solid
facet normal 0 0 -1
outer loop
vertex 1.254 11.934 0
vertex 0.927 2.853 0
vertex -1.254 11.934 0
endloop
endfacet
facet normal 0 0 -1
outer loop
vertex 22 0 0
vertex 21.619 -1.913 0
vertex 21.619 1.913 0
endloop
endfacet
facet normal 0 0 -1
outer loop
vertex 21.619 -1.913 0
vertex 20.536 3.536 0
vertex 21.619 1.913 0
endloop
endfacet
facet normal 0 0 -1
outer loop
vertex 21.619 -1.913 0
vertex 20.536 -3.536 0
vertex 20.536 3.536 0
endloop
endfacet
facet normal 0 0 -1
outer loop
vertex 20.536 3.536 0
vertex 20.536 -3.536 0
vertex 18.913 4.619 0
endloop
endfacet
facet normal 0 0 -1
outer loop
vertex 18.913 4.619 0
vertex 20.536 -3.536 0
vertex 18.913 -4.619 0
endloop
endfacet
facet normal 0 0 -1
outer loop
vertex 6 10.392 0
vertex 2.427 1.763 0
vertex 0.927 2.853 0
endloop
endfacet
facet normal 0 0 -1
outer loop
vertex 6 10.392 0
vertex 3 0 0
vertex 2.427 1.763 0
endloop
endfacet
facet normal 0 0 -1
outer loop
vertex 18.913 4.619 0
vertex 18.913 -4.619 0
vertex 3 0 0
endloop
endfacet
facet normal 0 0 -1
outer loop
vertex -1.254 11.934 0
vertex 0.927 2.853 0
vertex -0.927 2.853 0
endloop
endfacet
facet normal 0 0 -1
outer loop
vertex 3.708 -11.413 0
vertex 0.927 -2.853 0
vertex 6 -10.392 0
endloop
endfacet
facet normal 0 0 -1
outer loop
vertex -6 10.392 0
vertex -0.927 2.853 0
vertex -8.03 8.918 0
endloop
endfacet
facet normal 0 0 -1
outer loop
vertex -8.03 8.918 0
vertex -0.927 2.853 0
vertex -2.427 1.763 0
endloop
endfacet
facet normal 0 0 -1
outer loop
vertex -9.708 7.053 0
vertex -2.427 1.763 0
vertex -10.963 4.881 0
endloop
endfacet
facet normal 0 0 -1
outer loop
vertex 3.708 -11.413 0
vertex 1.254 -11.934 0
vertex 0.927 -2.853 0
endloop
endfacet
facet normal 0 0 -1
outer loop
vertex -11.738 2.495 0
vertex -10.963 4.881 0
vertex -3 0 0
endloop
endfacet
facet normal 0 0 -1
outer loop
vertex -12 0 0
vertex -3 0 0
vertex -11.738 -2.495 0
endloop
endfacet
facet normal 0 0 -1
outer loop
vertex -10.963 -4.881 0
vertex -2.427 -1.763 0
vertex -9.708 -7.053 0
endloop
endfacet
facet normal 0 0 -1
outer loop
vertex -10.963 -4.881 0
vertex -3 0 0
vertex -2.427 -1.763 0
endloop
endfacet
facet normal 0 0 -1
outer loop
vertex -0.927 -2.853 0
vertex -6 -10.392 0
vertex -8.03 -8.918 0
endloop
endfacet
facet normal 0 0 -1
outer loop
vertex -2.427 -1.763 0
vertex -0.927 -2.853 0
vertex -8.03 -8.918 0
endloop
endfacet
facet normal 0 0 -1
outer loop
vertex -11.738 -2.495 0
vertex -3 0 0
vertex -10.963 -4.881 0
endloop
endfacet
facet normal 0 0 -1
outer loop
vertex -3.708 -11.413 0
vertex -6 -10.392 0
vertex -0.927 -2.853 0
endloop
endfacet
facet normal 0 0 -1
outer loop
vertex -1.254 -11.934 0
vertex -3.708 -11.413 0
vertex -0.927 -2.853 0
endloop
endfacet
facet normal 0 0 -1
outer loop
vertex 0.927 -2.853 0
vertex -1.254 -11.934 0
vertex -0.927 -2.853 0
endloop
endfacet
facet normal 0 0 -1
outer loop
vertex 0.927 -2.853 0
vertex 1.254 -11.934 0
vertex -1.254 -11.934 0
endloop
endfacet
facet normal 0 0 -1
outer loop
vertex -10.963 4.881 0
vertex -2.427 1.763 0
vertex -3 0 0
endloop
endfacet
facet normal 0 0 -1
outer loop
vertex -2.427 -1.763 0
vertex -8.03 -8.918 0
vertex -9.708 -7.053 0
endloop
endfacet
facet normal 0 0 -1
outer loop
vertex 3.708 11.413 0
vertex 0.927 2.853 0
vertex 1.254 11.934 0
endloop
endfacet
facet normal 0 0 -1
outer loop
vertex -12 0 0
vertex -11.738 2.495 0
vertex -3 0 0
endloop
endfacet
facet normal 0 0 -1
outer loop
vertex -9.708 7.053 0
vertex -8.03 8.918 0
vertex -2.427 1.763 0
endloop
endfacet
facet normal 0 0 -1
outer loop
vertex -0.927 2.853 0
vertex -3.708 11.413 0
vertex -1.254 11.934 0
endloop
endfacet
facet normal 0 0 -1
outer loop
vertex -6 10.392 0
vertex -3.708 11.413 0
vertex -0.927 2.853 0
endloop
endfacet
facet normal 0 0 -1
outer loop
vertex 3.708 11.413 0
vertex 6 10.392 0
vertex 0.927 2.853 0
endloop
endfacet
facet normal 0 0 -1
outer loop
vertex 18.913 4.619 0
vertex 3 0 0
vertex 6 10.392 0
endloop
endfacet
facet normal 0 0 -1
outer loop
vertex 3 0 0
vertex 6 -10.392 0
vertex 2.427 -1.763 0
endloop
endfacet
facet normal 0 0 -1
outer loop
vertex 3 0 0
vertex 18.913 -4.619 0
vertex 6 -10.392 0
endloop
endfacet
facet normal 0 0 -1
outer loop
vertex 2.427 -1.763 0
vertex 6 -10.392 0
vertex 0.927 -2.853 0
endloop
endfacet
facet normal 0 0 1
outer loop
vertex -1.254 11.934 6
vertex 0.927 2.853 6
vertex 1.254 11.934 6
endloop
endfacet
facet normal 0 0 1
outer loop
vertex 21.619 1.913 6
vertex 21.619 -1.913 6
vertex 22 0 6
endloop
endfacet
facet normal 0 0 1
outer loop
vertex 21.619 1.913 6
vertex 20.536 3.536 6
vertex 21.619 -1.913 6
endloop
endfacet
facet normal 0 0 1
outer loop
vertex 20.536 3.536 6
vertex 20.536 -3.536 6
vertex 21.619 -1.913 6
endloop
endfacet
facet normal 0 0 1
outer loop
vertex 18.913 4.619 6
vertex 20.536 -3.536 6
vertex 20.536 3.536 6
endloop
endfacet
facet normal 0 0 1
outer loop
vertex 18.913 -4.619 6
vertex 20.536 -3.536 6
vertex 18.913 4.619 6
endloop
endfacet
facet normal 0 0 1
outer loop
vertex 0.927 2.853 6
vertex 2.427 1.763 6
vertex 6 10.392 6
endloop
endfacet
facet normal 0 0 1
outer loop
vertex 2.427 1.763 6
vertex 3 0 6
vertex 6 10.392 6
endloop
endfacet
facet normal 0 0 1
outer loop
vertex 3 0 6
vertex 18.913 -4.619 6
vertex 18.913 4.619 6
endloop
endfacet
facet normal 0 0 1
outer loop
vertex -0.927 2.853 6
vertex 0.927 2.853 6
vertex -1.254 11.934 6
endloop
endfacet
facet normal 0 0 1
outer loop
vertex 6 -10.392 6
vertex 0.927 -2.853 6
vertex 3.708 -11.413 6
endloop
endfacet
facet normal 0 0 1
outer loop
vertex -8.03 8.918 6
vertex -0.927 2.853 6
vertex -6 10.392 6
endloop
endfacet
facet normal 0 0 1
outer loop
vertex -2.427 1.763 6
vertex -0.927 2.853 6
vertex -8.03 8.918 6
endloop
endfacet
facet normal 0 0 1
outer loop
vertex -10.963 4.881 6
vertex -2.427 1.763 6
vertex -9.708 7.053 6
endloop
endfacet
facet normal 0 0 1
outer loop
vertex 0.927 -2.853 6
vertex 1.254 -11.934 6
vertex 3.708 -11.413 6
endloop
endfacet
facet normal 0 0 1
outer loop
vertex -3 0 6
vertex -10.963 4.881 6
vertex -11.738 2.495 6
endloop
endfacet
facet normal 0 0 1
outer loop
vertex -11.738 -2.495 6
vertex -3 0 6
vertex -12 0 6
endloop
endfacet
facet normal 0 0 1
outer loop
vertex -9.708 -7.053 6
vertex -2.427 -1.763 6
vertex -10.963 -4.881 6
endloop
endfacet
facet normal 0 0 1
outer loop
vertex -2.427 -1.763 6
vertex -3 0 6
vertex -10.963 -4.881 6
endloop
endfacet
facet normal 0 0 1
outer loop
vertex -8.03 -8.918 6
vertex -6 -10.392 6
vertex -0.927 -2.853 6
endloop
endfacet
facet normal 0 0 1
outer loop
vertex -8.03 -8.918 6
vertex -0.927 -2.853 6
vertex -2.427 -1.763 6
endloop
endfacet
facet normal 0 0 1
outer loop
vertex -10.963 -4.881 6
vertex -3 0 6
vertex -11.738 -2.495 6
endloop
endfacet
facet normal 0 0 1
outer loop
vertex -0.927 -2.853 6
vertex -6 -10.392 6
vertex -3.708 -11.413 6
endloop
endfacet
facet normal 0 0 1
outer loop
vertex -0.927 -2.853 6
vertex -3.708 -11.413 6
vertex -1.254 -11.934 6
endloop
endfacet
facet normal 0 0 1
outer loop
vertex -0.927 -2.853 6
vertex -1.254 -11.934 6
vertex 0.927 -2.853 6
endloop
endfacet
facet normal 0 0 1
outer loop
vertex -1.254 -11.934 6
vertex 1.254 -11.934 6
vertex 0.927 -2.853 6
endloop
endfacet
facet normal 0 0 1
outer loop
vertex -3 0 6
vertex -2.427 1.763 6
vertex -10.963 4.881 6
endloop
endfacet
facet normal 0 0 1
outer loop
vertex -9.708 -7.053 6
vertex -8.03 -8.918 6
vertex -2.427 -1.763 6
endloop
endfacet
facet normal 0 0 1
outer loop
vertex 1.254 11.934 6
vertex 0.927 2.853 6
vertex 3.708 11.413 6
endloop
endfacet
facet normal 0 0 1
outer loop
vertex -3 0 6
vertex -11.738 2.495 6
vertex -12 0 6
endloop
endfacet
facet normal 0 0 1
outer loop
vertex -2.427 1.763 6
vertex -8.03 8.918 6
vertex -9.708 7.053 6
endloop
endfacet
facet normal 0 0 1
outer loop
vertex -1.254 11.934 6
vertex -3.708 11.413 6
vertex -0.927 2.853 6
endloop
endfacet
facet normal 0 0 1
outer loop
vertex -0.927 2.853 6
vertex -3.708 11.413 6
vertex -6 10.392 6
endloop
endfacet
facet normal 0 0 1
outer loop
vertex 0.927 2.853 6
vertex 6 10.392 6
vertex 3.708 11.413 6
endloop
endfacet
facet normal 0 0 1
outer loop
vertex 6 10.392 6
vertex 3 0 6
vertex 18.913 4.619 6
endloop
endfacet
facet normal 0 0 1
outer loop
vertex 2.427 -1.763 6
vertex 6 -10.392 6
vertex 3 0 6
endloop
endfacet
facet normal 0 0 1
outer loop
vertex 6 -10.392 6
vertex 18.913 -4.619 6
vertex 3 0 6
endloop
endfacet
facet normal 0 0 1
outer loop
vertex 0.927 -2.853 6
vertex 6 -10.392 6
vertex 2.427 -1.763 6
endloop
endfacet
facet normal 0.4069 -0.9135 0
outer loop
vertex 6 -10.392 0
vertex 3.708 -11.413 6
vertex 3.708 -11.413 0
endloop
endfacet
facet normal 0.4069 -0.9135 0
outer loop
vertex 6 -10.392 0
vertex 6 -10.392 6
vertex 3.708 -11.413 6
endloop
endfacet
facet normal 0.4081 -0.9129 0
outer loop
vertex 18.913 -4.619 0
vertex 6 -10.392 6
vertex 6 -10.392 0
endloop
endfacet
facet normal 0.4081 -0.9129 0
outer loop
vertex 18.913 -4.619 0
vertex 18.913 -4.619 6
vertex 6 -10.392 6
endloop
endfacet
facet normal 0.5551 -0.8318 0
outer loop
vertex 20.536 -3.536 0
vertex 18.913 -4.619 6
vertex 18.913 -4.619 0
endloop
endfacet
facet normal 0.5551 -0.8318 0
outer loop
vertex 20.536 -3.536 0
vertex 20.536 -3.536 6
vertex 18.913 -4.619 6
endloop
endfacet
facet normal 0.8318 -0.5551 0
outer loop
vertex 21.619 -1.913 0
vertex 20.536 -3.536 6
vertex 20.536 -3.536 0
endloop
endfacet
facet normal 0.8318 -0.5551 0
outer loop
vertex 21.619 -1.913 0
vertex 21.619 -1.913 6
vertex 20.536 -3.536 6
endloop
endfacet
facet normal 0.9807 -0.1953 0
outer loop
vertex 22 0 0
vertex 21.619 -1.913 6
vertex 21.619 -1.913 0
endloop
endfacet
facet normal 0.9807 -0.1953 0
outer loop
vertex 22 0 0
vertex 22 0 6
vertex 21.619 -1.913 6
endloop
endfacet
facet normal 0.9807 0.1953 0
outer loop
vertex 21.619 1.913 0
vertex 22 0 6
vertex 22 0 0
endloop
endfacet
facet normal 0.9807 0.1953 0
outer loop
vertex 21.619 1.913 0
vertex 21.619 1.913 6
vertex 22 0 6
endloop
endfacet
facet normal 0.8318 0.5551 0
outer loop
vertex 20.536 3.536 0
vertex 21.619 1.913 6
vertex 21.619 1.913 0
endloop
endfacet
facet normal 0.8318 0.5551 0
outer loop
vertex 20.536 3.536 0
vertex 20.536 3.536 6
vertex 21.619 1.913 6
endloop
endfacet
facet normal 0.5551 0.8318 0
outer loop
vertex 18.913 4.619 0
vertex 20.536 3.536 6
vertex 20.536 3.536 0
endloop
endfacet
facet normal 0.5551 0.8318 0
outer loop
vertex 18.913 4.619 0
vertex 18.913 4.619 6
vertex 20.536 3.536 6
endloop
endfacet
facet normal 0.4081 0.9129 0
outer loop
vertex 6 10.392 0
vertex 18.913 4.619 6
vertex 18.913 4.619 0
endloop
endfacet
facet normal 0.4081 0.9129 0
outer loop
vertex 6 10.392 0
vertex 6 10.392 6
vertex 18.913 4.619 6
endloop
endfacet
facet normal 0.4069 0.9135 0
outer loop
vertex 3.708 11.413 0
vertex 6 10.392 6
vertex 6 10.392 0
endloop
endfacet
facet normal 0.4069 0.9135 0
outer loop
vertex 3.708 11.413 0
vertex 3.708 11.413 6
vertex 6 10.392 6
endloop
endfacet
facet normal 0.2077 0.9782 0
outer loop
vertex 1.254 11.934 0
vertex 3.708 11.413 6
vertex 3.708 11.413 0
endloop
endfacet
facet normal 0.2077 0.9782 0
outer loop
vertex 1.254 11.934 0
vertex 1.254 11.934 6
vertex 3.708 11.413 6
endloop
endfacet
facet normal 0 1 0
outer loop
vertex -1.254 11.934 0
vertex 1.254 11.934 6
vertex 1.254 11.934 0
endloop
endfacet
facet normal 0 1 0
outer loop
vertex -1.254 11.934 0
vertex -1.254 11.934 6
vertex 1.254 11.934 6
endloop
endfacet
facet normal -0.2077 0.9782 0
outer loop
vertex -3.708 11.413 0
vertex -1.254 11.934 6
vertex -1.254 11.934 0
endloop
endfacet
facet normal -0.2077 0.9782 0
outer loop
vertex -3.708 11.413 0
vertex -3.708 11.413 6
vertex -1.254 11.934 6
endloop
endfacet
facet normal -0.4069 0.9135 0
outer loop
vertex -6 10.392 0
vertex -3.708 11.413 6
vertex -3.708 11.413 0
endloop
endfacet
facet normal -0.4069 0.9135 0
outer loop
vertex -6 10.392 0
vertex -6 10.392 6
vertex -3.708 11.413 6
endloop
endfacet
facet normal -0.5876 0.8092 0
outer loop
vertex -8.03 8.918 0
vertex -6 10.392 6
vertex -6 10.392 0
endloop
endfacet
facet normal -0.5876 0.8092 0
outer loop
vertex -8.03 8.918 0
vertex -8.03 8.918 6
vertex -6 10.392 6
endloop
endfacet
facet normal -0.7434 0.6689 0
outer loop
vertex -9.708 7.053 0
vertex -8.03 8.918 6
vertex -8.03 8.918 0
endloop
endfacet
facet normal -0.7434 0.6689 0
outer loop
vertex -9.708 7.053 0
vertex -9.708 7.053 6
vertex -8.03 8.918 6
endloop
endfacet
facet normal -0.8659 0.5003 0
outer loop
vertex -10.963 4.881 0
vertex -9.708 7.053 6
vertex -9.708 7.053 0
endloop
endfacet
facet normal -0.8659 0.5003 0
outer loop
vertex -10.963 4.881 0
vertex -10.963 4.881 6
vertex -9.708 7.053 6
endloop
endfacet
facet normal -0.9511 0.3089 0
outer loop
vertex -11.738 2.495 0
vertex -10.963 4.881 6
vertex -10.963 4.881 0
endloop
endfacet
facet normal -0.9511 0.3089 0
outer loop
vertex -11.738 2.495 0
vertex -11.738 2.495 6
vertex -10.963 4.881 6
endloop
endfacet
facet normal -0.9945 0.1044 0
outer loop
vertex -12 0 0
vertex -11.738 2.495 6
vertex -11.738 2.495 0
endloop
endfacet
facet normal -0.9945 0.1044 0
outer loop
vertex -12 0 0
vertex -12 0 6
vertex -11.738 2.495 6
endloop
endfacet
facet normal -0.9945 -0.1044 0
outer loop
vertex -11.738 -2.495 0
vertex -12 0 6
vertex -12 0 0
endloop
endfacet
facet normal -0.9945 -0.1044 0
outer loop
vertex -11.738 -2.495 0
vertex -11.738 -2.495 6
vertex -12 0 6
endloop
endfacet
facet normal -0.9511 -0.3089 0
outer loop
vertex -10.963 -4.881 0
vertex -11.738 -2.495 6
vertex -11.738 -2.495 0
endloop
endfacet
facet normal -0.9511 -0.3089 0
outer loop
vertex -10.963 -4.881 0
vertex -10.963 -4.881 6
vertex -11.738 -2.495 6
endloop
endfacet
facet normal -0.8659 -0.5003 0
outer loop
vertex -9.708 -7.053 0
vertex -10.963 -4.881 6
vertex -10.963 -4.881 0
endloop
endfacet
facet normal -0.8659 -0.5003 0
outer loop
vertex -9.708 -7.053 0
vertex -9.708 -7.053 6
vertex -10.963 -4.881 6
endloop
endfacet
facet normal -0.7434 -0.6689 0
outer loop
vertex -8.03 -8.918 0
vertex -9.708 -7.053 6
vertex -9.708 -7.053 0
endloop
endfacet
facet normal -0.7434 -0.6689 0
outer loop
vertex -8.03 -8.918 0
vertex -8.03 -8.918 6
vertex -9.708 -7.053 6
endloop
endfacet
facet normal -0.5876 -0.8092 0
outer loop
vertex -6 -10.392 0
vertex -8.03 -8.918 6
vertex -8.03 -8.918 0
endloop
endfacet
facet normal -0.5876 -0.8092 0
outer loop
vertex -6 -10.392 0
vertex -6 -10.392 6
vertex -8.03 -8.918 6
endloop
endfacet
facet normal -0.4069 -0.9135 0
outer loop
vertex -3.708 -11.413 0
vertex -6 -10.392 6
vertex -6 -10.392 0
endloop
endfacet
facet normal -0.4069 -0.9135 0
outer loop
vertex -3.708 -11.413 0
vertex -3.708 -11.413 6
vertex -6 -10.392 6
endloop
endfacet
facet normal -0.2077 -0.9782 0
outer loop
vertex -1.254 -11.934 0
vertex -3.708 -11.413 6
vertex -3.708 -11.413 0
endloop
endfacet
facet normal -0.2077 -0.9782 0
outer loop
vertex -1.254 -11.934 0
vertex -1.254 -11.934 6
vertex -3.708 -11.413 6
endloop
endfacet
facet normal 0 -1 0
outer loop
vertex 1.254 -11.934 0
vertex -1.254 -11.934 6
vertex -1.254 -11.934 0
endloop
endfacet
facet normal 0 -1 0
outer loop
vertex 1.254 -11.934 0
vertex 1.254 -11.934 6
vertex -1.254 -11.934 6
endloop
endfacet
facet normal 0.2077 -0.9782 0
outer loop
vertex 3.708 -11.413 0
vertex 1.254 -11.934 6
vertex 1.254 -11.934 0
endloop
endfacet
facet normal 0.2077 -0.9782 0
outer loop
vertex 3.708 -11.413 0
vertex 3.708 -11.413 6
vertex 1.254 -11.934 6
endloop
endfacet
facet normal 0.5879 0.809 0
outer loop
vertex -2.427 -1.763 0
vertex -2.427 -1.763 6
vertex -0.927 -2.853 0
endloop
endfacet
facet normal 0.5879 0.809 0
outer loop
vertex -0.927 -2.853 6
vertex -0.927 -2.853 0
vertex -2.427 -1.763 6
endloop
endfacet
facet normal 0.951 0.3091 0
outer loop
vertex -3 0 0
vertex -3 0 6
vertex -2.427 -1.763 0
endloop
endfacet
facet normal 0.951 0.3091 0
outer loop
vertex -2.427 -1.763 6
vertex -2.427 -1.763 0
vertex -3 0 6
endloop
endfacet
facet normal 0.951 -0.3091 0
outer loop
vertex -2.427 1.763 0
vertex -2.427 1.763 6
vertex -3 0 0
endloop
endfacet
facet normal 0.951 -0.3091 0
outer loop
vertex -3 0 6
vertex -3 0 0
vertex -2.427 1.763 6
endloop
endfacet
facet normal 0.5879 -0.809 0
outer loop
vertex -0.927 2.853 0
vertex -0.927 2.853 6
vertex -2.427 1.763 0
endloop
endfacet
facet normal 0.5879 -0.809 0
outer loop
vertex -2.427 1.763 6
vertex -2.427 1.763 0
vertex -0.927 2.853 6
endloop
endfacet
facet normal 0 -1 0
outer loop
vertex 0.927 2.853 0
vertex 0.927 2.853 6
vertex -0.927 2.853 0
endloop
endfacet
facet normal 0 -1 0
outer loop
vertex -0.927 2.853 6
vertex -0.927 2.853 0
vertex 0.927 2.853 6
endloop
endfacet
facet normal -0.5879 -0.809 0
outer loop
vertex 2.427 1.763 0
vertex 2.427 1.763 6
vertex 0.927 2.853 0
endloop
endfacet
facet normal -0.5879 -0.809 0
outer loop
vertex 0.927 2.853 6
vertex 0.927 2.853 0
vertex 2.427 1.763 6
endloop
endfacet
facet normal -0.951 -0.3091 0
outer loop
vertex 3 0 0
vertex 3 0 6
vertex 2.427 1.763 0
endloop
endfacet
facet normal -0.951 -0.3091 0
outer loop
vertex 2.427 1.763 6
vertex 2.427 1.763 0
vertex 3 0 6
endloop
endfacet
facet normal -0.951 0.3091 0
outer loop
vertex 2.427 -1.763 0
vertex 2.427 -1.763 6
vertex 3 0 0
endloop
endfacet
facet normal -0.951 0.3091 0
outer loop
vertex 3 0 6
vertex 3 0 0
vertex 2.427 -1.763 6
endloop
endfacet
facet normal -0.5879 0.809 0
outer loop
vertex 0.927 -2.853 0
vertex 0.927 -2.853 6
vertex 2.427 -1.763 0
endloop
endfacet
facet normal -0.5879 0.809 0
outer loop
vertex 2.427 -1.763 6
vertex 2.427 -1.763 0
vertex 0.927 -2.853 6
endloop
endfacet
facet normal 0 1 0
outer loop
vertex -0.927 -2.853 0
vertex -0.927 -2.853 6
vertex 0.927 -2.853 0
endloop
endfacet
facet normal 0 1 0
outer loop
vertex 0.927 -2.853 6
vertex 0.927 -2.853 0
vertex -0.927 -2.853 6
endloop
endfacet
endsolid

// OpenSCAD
// Plate cam: a base circle and a nose circle joined by tangents, with a bore
base_r = 12;     // [6:30]
nose_r = 5;      // [2:15]
lift = 10;       // [2:30]
thickness = 6;   // [2:20]
bore = 6;        // [2:0.5:12]

linear_extrude(height = thickness)
  difference() {
    hull() {
      circle(r = base_r);
      translate([base_r + lift - nose_r, 0]) circle(r = nose_r);
    }
    circle(d = bore);
  }
